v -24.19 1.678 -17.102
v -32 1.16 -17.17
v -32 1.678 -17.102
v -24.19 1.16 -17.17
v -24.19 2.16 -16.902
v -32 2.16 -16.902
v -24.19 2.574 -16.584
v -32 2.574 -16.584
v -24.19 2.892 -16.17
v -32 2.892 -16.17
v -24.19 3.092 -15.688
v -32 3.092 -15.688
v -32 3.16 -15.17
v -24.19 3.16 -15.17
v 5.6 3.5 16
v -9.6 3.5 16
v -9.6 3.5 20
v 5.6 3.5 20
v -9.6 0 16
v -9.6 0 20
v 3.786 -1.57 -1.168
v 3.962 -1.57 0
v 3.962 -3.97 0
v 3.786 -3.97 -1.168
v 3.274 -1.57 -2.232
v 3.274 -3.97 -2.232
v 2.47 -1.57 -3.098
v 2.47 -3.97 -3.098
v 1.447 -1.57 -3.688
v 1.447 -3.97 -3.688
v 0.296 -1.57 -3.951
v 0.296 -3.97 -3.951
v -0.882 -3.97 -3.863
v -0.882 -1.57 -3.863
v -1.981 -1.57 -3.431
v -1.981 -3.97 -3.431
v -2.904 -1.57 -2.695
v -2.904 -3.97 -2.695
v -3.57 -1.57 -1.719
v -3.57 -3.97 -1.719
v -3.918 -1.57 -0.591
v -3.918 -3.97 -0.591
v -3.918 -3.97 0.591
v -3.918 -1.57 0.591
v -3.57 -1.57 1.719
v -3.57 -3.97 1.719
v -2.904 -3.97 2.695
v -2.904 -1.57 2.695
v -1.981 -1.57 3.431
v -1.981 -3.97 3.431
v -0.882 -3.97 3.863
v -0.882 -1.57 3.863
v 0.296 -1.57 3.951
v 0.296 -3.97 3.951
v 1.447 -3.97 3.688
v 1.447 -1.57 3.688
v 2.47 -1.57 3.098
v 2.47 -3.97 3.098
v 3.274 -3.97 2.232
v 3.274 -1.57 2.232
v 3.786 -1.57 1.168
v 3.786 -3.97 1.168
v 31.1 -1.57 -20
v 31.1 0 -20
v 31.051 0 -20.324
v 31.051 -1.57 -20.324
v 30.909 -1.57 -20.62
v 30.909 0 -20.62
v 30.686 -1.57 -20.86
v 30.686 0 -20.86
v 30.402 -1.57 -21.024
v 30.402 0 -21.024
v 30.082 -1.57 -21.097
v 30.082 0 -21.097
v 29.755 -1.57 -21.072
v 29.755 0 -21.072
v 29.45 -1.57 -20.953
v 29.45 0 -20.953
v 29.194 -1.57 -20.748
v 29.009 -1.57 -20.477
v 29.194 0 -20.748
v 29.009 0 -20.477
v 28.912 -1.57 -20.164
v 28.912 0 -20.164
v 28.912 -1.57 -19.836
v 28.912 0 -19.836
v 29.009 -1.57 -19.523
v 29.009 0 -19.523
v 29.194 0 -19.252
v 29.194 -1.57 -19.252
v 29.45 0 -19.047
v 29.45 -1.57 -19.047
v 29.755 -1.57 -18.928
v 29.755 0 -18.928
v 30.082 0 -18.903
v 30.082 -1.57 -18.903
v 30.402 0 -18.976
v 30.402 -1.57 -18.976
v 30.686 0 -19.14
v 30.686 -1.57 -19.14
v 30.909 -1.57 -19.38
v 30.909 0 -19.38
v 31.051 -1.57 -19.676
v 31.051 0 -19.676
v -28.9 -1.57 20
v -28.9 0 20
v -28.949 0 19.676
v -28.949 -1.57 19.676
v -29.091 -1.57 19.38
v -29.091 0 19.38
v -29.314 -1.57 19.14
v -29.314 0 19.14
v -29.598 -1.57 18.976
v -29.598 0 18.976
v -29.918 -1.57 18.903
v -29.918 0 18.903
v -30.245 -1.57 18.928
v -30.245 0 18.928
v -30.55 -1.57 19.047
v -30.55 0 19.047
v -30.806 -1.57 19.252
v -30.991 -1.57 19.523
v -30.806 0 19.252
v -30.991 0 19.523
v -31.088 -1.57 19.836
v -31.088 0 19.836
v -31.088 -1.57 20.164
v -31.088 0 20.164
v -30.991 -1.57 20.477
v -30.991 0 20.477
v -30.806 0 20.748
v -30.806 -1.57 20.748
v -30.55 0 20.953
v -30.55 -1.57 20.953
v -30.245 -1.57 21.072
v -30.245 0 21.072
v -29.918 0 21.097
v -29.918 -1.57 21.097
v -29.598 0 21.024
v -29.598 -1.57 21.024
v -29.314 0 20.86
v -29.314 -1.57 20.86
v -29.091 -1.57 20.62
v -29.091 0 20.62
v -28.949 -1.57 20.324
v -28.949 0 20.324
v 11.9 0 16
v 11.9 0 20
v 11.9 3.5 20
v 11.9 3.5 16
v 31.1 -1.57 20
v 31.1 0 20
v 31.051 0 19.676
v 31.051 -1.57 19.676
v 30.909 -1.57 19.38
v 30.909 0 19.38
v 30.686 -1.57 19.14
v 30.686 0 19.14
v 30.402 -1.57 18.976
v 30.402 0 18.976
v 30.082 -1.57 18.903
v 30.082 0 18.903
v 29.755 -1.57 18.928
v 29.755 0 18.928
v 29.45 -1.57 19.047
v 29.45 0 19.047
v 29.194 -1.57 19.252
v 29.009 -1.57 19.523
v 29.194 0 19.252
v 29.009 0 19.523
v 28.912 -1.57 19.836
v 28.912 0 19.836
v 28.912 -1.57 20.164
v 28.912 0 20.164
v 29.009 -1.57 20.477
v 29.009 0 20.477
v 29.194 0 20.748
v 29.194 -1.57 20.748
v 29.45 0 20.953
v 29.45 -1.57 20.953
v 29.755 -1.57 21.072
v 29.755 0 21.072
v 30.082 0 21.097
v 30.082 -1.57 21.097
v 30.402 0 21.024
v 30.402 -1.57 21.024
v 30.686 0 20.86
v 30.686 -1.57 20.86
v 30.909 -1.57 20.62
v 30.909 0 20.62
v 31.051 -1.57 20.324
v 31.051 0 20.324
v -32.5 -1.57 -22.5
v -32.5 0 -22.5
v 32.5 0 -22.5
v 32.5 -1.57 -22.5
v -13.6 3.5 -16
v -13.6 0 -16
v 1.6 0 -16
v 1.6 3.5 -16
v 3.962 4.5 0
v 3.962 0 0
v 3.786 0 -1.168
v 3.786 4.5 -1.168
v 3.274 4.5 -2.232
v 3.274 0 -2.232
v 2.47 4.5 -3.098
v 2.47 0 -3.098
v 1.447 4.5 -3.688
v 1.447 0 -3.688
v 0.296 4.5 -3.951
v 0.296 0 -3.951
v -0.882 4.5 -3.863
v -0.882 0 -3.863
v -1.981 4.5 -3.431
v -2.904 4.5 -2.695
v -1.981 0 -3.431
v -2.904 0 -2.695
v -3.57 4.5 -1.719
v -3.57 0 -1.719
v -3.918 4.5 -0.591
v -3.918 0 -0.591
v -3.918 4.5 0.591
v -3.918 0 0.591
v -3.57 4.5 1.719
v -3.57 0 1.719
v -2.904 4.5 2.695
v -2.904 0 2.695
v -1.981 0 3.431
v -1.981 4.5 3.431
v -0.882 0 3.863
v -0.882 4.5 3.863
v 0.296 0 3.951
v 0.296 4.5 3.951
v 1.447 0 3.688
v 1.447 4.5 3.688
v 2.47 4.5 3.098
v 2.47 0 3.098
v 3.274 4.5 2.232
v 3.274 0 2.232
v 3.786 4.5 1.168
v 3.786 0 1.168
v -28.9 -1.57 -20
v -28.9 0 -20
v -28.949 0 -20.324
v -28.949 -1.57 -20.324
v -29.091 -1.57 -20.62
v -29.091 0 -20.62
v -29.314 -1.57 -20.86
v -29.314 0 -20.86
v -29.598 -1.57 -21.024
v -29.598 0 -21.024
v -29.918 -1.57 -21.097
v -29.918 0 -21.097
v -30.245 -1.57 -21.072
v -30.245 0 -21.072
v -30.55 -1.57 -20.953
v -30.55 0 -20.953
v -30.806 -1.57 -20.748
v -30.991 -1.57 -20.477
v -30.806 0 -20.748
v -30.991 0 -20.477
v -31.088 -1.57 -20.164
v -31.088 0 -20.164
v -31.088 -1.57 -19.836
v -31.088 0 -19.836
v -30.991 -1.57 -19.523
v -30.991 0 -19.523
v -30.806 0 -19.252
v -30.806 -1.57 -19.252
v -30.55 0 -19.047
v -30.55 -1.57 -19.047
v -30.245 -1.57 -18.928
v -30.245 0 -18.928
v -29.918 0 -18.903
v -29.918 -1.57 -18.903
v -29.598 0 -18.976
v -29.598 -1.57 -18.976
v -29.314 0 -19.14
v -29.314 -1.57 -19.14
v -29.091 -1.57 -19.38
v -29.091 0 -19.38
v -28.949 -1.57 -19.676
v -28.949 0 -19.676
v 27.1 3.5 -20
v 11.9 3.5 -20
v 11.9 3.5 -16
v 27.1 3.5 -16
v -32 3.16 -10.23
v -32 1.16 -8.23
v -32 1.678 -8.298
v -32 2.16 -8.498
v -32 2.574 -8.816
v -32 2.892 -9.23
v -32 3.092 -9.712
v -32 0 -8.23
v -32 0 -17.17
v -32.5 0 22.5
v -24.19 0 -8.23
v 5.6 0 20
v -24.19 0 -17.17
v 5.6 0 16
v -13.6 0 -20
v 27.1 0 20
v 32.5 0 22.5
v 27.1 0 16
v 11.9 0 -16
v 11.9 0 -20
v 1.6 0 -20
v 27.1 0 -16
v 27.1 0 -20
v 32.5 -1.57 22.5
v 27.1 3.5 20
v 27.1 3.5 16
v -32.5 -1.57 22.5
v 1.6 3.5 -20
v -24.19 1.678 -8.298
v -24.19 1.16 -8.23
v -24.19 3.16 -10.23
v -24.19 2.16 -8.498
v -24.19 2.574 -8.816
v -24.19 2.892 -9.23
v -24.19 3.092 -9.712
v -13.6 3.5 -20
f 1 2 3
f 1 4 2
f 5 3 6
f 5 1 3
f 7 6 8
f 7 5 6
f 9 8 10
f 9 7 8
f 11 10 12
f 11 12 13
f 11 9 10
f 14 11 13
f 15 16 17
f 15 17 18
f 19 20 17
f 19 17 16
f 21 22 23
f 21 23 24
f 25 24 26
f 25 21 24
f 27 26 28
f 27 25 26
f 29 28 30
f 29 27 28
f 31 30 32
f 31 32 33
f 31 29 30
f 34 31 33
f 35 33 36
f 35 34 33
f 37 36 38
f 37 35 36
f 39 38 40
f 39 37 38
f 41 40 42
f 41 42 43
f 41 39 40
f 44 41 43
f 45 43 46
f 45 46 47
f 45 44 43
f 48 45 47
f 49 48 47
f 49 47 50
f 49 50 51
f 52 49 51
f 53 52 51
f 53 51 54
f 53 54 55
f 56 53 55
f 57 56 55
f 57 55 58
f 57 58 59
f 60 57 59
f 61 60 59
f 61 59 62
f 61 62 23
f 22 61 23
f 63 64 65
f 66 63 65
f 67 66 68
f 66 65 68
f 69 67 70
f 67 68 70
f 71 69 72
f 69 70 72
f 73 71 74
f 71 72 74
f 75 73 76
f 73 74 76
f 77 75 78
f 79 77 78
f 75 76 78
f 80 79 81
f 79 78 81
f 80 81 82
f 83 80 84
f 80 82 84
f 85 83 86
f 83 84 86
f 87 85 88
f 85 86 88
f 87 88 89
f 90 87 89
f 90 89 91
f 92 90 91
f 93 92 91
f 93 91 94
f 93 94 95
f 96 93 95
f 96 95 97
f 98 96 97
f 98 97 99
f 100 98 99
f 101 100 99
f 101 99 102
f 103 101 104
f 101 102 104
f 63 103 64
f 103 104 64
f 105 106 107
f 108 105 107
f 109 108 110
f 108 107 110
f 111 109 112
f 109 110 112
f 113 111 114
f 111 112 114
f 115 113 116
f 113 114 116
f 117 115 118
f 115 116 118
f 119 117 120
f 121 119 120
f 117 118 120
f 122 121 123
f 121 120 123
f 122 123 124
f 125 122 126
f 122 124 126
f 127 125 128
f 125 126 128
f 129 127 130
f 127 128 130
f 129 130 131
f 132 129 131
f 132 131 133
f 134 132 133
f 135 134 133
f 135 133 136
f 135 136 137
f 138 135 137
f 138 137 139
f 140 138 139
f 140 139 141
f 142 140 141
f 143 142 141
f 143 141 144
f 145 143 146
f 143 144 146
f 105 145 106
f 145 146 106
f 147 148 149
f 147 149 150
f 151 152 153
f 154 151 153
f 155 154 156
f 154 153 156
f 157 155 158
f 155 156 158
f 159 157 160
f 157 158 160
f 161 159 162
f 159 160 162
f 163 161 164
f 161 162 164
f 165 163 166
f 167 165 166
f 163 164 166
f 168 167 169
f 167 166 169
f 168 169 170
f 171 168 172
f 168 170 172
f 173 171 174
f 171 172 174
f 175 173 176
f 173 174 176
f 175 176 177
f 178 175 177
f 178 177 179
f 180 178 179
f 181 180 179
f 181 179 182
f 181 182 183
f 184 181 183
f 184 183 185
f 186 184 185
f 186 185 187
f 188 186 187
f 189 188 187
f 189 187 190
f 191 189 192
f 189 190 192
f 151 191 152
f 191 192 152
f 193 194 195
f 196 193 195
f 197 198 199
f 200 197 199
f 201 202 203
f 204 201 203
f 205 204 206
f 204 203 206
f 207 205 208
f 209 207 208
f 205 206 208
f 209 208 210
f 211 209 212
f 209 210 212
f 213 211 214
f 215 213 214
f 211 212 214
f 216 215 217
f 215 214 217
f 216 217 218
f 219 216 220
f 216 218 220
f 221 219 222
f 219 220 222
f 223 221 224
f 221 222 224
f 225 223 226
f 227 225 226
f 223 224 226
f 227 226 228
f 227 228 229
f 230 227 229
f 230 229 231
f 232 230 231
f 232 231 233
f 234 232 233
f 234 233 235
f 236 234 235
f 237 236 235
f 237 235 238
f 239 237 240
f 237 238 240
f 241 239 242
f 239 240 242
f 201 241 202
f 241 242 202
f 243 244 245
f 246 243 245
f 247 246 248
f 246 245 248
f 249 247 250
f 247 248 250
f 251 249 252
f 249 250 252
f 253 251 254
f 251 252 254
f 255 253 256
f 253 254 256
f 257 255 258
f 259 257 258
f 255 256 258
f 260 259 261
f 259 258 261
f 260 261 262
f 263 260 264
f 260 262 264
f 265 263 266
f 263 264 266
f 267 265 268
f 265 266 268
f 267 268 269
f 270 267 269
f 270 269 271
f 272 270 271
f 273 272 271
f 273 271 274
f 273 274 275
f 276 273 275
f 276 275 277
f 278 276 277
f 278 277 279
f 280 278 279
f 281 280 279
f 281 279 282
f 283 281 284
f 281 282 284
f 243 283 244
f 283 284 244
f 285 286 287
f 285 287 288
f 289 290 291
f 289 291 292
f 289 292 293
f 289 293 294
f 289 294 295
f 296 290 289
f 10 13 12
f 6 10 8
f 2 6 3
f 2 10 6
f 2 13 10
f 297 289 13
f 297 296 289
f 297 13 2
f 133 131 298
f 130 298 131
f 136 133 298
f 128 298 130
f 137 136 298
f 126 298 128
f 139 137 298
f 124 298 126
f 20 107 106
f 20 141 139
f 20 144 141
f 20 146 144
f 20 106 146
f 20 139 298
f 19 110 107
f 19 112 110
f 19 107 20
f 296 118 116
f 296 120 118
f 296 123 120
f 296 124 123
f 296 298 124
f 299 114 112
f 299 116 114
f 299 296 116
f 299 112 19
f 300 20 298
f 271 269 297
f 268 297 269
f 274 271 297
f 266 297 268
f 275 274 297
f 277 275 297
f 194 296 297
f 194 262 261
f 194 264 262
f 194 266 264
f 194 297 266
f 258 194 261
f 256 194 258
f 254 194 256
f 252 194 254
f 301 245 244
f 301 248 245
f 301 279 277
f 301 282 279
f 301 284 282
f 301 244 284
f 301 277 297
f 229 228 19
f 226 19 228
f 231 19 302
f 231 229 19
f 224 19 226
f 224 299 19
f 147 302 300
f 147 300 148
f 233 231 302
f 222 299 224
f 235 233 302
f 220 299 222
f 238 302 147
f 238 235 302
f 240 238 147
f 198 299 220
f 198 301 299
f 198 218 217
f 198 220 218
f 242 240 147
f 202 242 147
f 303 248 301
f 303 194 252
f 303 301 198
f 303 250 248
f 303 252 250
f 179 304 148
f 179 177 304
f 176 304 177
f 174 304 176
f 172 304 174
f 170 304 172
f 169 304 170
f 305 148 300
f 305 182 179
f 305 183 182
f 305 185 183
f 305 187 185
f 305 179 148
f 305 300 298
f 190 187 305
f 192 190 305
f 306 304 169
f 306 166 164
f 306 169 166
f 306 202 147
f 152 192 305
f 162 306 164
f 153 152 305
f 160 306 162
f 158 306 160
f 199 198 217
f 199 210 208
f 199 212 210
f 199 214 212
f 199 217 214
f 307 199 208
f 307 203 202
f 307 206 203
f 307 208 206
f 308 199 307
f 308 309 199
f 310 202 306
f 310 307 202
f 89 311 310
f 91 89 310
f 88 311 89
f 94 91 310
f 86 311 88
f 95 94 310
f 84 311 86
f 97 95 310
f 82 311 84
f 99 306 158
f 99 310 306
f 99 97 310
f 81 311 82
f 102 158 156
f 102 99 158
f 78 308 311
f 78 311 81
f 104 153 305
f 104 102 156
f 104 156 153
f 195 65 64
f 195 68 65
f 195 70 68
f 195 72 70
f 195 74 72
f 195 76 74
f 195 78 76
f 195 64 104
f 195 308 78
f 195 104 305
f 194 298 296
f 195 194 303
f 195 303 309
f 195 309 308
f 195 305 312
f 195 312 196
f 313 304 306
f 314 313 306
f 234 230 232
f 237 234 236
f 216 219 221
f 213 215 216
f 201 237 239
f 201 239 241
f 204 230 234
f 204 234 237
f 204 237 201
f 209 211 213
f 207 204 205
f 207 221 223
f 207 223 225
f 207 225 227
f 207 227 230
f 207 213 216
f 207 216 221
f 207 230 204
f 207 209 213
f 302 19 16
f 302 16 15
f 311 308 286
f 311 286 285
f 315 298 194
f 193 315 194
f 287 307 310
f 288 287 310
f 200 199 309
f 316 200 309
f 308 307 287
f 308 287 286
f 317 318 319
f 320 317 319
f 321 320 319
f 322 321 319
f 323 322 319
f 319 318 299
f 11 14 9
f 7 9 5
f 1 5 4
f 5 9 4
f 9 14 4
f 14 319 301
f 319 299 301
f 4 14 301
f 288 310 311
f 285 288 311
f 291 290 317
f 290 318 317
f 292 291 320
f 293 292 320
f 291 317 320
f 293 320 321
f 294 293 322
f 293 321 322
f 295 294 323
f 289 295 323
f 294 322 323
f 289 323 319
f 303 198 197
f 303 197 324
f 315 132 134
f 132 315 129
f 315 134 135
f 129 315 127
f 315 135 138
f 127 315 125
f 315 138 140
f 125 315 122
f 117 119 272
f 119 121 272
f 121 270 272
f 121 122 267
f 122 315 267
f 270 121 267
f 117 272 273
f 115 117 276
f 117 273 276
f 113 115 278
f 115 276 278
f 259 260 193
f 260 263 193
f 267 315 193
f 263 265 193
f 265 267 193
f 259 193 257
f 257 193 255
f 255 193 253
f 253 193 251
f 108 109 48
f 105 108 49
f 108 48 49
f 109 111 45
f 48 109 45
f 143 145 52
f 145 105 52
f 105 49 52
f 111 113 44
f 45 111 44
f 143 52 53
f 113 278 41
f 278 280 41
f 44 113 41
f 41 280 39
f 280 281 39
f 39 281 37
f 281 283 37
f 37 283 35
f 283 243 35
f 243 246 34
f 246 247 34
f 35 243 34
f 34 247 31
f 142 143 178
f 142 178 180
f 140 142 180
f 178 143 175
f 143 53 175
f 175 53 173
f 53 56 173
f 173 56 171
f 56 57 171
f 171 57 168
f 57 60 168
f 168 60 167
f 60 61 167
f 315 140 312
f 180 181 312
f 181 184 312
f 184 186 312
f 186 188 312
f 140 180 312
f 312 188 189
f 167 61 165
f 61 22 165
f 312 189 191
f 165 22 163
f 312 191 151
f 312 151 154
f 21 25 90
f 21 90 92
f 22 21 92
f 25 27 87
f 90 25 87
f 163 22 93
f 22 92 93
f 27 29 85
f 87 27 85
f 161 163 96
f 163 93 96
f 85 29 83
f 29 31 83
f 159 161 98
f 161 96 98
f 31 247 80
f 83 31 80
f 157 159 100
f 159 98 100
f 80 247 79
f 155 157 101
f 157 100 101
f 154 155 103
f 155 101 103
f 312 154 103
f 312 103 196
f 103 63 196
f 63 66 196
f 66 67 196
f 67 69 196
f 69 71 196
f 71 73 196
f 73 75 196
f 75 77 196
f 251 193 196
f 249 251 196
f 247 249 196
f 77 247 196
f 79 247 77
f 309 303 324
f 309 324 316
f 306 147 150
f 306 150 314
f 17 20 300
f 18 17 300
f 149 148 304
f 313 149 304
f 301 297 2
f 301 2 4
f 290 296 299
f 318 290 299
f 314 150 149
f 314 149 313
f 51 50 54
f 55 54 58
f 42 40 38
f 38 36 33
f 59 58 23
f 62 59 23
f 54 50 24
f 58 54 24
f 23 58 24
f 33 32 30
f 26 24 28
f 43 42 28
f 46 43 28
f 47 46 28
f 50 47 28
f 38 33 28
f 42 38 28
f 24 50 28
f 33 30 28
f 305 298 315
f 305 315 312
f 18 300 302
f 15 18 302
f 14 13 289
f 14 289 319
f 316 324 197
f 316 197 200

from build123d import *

# Parameters (mm, degrees)
SKETCH1_W                = 65
SKETCH1_H                = 45
SKETCH1_R                = 1.1
BOSS_EXTRUDE1_DEPTH      = 1.57
SKETCH1_4_W              = 15.2
SKETCH1_4_H              = 4
BOSS_EXTRUDE2_DEPTH      = 3.5
BOSS_EXTRUDE3_DEPTH      = 4.5
BOSS_EXTRUDE3_DEPTH_BACK = 3.97
SKETCH1_5_R              = 3.9620477
SKETCH2_W                = 7.81
SKETCH2_H                = 8.94
BOSS_EXTRUDE4_DEPTH      = 3.16
FILLET1_R                = 2


with BuildPart() as part:
    # Sketch1 → Boss-Extrude1 (new body)
    with BuildSketch(Plane(origin=(0, 0, 0), x_dir=(1, 0, 0), z_dir=(0, 1, 0))):
        Rectangle(SKETCH1_W, SKETCH1_H)
        with Locations((-30, -20)):
            Circle(SKETCH1_R, mode=Mode.SUBTRACT)
        with Locations((30, -20)):
            Circle(SKETCH1_R, mode=Mode.SUBTRACT)
        with Locations((-30, 20)):
            Circle(SKETCH1_R, mode=Mode.SUBTRACT)
        with Locations((30, 20)):
            Circle(SKETCH1_R, mode=Mode.SUBTRACT)
    extrude(amount=-BOSS_EXTRUDE1_DEPTH)

    # Sketch1<4> → Boss-Extrude2 (add)
    with BuildSketch(Plane(origin=(0, 0, 0), x_dir=(1, 0, 0), z_dir=(0, 1, 0))):
        with Locations((-2, -18)):
            Rectangle(SKETCH1_4_W, SKETCH1_4_H)
        with Locations((19.5, -18)):
            Rectangle(SKETCH1_4_W, SKETCH1_4_H)
        with Locations((-6, 18)):
            Rectangle(SKETCH1_4_W, SKETCH1_4_H)
        with Locations((19.5, 18)):
            Rectangle(SKETCH1_4_W, SKETCH1_4_H)
    extrude(amount=BOSS_EXTRUDE2_DEPTH)

    # Sketch1<5> → Boss-Extrude3 (add, two sides: drawn at the far end of the back side and taken through both)
    with BuildSketch(Plane(origin=(0, 0, 0), x_dir=(1, 0, 0), z_dir=(0, 1, 0)).offset(-BOSS_EXTRUDE3_DEPTH_BACK)):
        Circle(SKETCH1_5_R)
    extrude(amount=BOSS_EXTRUDE3_DEPTH + BOSS_EXTRUDE3_DEPTH_BACK)

    # Sketch2 → Boss-Extrude4 (add)
    with BuildSketch(Plane(origin=(0, 0, 0), x_dir=(1, 0, 0), z_dir=(0, 1, 0))):
        with Locations((-28.095, 12.70000129)):
            Rectangle(SKETCH2_W, SKETCH2_H)
    extrude(amount=BOSS_EXTRUDE4_DEPTH)

    # Fillet1
    fillet1_edges = [part.edges().sort_by_distance(p)[0] for p in [
        (-28.095, 3.16, -17.17000129),
        (-28.095, 3.16, -8.23000129),
    ]]
    fillet(fillet1_edges, radius=FILLET1_R)


solid = part.part
